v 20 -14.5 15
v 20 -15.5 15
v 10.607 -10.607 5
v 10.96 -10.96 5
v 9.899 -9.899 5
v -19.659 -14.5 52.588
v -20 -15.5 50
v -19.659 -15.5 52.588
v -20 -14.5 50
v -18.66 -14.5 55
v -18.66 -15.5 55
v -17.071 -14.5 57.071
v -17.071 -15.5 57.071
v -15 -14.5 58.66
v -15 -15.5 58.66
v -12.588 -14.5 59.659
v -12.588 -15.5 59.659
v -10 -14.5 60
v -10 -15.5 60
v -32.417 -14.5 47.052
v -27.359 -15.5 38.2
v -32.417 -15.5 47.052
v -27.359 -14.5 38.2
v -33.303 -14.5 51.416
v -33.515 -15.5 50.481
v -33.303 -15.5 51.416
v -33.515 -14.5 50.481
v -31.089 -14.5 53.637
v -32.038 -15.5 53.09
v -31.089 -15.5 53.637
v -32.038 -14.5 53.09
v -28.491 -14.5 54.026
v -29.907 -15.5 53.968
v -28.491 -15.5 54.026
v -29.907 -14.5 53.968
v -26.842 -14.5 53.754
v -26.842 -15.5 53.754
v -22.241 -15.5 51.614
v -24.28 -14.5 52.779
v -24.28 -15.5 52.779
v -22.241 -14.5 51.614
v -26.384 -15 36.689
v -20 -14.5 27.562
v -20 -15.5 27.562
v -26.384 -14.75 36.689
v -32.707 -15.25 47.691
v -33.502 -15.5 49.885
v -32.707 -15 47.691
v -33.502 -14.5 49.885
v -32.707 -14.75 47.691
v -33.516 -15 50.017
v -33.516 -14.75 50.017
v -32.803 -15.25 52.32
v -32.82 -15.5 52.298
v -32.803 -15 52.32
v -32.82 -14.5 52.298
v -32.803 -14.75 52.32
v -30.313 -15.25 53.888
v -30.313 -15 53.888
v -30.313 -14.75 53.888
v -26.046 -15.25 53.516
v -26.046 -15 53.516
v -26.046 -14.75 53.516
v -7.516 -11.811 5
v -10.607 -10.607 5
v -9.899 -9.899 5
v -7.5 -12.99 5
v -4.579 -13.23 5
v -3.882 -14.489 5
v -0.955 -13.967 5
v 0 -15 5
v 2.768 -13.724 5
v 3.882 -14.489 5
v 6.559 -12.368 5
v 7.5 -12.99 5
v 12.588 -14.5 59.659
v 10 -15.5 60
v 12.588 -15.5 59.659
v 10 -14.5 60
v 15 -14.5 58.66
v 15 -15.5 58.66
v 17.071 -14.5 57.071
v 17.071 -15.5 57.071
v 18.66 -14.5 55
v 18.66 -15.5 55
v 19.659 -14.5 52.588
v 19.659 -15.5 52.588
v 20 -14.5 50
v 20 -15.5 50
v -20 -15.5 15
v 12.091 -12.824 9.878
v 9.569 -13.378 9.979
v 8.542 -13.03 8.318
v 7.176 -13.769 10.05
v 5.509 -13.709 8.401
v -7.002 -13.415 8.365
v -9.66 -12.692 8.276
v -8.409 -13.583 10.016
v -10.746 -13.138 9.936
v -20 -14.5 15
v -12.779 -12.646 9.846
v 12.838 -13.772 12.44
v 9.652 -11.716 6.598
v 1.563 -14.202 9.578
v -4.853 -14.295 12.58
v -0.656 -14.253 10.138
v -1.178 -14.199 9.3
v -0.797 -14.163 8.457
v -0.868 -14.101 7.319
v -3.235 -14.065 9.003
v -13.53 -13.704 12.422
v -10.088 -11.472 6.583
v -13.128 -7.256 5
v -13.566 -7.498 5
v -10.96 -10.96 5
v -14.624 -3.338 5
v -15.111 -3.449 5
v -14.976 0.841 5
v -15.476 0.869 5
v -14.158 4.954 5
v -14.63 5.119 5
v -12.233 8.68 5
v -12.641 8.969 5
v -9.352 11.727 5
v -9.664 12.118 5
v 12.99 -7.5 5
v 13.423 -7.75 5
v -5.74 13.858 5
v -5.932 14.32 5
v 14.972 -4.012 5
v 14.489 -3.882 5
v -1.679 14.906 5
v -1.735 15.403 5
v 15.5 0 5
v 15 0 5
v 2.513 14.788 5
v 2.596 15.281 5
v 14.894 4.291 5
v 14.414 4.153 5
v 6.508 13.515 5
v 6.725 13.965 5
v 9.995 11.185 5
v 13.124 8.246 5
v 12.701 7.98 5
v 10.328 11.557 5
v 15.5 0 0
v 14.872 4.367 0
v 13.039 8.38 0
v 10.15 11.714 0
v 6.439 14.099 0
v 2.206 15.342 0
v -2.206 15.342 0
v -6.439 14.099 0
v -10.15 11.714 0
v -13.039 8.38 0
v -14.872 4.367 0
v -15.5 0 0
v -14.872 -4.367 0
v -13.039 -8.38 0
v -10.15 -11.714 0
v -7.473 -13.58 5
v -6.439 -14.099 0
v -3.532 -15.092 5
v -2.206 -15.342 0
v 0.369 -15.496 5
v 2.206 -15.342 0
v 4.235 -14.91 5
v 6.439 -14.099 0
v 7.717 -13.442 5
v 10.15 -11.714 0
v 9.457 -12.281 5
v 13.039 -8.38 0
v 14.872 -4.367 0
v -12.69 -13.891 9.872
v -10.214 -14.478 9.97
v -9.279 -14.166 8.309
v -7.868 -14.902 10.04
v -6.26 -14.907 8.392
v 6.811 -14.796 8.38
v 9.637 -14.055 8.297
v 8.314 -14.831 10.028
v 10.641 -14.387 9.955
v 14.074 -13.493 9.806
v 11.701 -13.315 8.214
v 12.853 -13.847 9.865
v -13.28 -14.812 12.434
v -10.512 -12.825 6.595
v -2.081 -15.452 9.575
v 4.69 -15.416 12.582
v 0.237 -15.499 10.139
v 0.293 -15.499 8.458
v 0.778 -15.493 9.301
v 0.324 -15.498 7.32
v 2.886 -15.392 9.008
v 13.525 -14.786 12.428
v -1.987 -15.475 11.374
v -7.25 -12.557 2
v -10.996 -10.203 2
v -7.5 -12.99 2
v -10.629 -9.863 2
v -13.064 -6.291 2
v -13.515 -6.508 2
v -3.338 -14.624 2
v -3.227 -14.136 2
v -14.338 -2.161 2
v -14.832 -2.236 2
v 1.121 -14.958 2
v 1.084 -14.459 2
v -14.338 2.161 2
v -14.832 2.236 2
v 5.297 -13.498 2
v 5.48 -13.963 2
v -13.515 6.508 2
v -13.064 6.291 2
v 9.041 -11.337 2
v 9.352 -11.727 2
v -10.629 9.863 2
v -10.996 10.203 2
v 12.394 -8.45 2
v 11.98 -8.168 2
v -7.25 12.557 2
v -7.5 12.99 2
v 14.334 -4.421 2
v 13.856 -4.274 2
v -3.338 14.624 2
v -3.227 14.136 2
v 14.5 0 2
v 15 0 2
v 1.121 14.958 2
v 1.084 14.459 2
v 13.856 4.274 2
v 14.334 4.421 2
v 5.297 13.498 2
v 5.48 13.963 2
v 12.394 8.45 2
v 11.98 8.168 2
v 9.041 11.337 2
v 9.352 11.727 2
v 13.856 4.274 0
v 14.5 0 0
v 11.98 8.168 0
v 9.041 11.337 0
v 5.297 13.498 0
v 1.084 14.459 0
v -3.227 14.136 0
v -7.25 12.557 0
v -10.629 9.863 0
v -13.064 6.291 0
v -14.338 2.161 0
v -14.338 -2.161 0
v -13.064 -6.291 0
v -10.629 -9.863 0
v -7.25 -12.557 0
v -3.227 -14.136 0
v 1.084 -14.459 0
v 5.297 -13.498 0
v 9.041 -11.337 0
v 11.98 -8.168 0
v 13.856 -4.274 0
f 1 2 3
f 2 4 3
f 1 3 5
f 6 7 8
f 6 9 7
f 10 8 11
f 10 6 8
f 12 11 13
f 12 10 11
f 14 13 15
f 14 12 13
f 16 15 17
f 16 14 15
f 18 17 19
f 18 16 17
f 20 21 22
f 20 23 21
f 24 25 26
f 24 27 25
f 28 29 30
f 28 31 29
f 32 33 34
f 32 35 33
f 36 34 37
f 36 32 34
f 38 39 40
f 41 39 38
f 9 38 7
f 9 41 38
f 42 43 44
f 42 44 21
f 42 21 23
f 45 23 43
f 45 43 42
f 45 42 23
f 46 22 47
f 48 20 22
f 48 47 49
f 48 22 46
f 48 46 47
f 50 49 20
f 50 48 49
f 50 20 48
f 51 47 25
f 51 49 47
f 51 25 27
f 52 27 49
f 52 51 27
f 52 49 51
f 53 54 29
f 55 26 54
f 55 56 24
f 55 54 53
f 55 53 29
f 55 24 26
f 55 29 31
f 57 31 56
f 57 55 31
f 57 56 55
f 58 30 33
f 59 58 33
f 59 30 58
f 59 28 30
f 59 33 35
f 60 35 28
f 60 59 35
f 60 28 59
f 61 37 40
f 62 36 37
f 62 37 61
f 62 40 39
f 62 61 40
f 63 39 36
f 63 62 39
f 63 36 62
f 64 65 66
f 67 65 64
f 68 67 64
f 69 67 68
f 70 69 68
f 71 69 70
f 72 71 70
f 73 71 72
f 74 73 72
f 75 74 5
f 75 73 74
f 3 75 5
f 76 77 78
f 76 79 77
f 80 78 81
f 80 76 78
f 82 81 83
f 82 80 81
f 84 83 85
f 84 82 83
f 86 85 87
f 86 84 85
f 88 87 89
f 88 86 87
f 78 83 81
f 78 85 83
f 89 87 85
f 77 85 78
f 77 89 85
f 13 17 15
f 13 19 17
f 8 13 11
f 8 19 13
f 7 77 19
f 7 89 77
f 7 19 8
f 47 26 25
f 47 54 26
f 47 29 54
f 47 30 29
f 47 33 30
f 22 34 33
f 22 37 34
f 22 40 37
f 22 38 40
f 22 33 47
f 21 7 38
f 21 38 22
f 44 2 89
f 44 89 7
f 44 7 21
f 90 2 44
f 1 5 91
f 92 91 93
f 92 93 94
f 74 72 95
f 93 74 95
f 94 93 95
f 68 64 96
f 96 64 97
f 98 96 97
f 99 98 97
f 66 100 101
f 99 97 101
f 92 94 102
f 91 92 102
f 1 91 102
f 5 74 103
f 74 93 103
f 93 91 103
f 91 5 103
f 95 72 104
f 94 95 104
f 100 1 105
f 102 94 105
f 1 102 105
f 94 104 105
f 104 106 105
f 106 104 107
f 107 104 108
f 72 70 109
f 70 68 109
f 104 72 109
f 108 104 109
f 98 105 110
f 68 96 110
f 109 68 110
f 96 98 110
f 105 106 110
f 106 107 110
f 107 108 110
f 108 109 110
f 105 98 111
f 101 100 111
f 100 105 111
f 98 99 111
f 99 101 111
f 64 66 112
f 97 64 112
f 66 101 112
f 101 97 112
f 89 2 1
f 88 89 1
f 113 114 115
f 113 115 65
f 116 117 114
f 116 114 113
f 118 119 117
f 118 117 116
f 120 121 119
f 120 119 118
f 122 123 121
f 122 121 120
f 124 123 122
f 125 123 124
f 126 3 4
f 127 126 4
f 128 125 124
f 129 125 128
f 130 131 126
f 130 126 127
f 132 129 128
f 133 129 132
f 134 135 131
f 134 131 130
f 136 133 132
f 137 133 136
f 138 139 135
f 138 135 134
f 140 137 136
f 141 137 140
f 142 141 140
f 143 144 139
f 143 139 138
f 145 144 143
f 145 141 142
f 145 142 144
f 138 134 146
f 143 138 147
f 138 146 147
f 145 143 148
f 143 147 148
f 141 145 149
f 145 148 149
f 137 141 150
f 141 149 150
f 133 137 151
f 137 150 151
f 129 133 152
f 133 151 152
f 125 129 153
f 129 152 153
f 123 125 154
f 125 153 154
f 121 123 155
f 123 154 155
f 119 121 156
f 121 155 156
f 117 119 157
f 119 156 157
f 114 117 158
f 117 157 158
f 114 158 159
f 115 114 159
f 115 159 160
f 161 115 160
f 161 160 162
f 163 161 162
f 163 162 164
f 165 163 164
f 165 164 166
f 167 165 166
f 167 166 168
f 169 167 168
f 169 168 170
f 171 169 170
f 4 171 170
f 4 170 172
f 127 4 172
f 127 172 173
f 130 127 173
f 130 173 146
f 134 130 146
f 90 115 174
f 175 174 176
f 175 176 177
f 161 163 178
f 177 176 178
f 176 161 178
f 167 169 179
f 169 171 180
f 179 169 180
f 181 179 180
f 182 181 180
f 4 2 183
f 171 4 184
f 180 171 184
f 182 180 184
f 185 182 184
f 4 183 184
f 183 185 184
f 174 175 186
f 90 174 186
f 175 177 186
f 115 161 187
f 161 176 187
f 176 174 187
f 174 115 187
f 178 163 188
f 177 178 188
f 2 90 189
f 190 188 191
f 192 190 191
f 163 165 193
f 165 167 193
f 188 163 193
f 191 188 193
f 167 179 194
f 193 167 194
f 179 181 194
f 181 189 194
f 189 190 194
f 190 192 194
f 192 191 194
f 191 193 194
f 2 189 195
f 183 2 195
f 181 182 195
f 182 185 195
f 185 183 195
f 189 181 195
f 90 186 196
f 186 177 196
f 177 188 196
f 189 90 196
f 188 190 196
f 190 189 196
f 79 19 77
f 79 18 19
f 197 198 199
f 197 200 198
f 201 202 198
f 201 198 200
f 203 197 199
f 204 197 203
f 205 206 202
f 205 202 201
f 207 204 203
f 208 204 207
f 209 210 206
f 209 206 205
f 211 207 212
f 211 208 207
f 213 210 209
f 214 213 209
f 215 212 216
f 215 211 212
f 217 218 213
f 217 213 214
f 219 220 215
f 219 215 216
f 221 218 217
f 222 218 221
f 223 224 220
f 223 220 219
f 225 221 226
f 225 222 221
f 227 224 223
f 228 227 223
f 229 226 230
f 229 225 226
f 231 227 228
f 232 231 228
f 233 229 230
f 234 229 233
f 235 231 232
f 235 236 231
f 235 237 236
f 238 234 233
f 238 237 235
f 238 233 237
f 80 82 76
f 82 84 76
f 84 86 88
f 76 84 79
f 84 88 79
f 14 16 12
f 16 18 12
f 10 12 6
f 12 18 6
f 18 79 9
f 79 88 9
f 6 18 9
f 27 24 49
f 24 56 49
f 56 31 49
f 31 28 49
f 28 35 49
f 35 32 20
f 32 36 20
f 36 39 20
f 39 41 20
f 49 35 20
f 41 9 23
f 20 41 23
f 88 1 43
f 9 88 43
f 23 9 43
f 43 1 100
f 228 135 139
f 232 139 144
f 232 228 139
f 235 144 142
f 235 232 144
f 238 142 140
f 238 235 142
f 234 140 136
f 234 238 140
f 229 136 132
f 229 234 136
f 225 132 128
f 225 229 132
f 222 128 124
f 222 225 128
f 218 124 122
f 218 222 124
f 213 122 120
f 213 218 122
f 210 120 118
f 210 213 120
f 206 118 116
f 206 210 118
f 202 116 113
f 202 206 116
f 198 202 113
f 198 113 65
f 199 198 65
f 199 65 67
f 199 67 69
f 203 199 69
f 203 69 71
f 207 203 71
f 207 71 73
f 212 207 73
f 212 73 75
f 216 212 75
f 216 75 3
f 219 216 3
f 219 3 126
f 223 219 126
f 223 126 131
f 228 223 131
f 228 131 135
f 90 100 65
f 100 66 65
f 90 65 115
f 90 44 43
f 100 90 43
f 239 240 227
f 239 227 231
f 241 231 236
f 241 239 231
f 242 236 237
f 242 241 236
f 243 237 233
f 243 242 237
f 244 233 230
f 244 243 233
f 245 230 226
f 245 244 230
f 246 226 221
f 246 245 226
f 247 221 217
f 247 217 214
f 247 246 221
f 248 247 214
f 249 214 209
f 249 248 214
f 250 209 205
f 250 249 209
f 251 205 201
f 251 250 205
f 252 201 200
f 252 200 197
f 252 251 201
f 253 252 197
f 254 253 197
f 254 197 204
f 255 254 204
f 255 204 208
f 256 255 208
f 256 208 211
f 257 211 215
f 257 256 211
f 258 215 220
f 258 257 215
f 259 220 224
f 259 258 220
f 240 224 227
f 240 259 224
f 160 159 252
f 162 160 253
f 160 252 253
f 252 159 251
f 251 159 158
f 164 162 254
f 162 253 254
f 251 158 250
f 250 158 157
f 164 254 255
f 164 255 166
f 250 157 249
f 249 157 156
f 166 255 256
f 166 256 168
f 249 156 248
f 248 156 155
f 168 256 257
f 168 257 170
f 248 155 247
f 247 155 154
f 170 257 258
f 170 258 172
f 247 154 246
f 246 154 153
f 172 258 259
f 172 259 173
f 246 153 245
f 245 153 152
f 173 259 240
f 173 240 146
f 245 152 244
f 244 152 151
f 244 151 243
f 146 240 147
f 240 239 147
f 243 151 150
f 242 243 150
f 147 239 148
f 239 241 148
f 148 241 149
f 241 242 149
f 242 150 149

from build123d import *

# Parameters (mm, degrees)
SKETCH1_R                = 15
SKETCH1_R_2              = 14.5
BOSS_EXTRUDE1_DEPTH      = 2
BOSS_EXTRUDE2_DEPTH      = 3
BOSS_EXTRUDE2_DEPTH_BACK = 2
SKETCH2_R                = 15.5
SKETCH2_R_2              = 15
SKETCH5_W                = 40
SKETCH5_H                = 1
BOSS_EXTRUDE3_DEPTH      = 45
FILLET1_R                = 10
BOSS_EXTRUDE4_DEPTH      = 1


with BuildPart() as part:
    # Sketch1 → Boss-Extrude1 (new body)
    with BuildSketch(Plane.XY):
        Circle(SKETCH1_R)
        Circle(SKETCH1_R_2, mode=Mode.SUBTRACT)
    extrude(amount=BOSS_EXTRUDE1_DEPTH)

    # Sketch2 → Boss-Extrude2 (add, two sides: drawn at the far end of the back side and taken through both)
    with BuildSketch(Plane.XY.offset(2).offset(-BOSS_EXTRUDE2_DEPTH_BACK)):
        Circle(SKETCH2_R)
        Circle(SKETCH2_R_2, mode=Mode.SUBTRACT)
    extrude(amount=BOSS_EXTRUDE2_DEPTH + BOSS_EXTRUDE2_DEPTH_BACK)

    # Sketch4 → Loft1 section 0
    with BuildSketch(Plane.XY.offset(15)):
        with BuildLine():
            Line((-20, -15.5), (20, -15.5))
            Line((20, -15.5), (20, -14.5))
            Line((20, -14.5), (-20, -14.5))
            Line((-20, -14.5), (-20, -15.5))
        make_face()
    # Sketch3 for Loft1 → Loft1 section 1
    with BuildSketch(Plane.XY.offset(5)):
        with BuildLine():
            Line((-9.899494937, -9.899494937), (-10.960155108, -10.960155108))
            # circular arc as an exact rational Bezier (weights 1, cos(half-angle), 1)
            Bezier((-10.960155108, -10.960155108), (0, -21.920310217), (10.960155108, -10.960155108), weights=[1, 0.707106781, 1])
            Line((10.960155108, -10.960155108), (9.899494937, -9.899494937))
            Bezier((9.899494937, -9.899494937), (0, -19.798989873), (-9.899494937, -9.899494937), weights=[1, 0.707106781, 1])
        make_face()
    loft()

    # Sketch5 → Boss-Extrude3 (add)
    with BuildSketch(Plane.XY.offset(15)):
        with Locations((0, -15)):
            Rectangle(SKETCH5_W, SKETCH5_H)
    extrude(amount=BOSS_EXTRUDE3_DEPTH)

    # Fillet1
    fillet1_edges = [part.edges().sort_by_distance(p)[0] for p in [
        (-20, -15, 60),
        (20, -15, 60),
    ]]
    fillet(fillet1_edges, radius=FILLET1_R)

    # Sketch6 → Boss-Extrude4 (add)
    with BuildSketch(Plane(origin=(0, -14.5, 0), x_dir=(1, 0, 0), z_dir=(0, 1, 0))):
        with BuildLine():
            Line((-20, -27.561598622), (-20, -50))
            add(Edge.make_bspline(
                [(-20, -27.561598622), (-23.684580214, -32.380435237), (-30.253613698, -42.286731283), (-33.147068254, -48.653521104), (-34.627998346, -52.209238413), (-29.246314481, -57.320630676), (-20, -50)],
                knots=[0, 0, 0, 0, 0.304772802, 0.350399974, 0.456271712, 1, 1, 1, 1], degree=3))
        make_face()
    extrude(amount=-BOSS_EXTRUDE4_DEPTH)


solid = part.part
